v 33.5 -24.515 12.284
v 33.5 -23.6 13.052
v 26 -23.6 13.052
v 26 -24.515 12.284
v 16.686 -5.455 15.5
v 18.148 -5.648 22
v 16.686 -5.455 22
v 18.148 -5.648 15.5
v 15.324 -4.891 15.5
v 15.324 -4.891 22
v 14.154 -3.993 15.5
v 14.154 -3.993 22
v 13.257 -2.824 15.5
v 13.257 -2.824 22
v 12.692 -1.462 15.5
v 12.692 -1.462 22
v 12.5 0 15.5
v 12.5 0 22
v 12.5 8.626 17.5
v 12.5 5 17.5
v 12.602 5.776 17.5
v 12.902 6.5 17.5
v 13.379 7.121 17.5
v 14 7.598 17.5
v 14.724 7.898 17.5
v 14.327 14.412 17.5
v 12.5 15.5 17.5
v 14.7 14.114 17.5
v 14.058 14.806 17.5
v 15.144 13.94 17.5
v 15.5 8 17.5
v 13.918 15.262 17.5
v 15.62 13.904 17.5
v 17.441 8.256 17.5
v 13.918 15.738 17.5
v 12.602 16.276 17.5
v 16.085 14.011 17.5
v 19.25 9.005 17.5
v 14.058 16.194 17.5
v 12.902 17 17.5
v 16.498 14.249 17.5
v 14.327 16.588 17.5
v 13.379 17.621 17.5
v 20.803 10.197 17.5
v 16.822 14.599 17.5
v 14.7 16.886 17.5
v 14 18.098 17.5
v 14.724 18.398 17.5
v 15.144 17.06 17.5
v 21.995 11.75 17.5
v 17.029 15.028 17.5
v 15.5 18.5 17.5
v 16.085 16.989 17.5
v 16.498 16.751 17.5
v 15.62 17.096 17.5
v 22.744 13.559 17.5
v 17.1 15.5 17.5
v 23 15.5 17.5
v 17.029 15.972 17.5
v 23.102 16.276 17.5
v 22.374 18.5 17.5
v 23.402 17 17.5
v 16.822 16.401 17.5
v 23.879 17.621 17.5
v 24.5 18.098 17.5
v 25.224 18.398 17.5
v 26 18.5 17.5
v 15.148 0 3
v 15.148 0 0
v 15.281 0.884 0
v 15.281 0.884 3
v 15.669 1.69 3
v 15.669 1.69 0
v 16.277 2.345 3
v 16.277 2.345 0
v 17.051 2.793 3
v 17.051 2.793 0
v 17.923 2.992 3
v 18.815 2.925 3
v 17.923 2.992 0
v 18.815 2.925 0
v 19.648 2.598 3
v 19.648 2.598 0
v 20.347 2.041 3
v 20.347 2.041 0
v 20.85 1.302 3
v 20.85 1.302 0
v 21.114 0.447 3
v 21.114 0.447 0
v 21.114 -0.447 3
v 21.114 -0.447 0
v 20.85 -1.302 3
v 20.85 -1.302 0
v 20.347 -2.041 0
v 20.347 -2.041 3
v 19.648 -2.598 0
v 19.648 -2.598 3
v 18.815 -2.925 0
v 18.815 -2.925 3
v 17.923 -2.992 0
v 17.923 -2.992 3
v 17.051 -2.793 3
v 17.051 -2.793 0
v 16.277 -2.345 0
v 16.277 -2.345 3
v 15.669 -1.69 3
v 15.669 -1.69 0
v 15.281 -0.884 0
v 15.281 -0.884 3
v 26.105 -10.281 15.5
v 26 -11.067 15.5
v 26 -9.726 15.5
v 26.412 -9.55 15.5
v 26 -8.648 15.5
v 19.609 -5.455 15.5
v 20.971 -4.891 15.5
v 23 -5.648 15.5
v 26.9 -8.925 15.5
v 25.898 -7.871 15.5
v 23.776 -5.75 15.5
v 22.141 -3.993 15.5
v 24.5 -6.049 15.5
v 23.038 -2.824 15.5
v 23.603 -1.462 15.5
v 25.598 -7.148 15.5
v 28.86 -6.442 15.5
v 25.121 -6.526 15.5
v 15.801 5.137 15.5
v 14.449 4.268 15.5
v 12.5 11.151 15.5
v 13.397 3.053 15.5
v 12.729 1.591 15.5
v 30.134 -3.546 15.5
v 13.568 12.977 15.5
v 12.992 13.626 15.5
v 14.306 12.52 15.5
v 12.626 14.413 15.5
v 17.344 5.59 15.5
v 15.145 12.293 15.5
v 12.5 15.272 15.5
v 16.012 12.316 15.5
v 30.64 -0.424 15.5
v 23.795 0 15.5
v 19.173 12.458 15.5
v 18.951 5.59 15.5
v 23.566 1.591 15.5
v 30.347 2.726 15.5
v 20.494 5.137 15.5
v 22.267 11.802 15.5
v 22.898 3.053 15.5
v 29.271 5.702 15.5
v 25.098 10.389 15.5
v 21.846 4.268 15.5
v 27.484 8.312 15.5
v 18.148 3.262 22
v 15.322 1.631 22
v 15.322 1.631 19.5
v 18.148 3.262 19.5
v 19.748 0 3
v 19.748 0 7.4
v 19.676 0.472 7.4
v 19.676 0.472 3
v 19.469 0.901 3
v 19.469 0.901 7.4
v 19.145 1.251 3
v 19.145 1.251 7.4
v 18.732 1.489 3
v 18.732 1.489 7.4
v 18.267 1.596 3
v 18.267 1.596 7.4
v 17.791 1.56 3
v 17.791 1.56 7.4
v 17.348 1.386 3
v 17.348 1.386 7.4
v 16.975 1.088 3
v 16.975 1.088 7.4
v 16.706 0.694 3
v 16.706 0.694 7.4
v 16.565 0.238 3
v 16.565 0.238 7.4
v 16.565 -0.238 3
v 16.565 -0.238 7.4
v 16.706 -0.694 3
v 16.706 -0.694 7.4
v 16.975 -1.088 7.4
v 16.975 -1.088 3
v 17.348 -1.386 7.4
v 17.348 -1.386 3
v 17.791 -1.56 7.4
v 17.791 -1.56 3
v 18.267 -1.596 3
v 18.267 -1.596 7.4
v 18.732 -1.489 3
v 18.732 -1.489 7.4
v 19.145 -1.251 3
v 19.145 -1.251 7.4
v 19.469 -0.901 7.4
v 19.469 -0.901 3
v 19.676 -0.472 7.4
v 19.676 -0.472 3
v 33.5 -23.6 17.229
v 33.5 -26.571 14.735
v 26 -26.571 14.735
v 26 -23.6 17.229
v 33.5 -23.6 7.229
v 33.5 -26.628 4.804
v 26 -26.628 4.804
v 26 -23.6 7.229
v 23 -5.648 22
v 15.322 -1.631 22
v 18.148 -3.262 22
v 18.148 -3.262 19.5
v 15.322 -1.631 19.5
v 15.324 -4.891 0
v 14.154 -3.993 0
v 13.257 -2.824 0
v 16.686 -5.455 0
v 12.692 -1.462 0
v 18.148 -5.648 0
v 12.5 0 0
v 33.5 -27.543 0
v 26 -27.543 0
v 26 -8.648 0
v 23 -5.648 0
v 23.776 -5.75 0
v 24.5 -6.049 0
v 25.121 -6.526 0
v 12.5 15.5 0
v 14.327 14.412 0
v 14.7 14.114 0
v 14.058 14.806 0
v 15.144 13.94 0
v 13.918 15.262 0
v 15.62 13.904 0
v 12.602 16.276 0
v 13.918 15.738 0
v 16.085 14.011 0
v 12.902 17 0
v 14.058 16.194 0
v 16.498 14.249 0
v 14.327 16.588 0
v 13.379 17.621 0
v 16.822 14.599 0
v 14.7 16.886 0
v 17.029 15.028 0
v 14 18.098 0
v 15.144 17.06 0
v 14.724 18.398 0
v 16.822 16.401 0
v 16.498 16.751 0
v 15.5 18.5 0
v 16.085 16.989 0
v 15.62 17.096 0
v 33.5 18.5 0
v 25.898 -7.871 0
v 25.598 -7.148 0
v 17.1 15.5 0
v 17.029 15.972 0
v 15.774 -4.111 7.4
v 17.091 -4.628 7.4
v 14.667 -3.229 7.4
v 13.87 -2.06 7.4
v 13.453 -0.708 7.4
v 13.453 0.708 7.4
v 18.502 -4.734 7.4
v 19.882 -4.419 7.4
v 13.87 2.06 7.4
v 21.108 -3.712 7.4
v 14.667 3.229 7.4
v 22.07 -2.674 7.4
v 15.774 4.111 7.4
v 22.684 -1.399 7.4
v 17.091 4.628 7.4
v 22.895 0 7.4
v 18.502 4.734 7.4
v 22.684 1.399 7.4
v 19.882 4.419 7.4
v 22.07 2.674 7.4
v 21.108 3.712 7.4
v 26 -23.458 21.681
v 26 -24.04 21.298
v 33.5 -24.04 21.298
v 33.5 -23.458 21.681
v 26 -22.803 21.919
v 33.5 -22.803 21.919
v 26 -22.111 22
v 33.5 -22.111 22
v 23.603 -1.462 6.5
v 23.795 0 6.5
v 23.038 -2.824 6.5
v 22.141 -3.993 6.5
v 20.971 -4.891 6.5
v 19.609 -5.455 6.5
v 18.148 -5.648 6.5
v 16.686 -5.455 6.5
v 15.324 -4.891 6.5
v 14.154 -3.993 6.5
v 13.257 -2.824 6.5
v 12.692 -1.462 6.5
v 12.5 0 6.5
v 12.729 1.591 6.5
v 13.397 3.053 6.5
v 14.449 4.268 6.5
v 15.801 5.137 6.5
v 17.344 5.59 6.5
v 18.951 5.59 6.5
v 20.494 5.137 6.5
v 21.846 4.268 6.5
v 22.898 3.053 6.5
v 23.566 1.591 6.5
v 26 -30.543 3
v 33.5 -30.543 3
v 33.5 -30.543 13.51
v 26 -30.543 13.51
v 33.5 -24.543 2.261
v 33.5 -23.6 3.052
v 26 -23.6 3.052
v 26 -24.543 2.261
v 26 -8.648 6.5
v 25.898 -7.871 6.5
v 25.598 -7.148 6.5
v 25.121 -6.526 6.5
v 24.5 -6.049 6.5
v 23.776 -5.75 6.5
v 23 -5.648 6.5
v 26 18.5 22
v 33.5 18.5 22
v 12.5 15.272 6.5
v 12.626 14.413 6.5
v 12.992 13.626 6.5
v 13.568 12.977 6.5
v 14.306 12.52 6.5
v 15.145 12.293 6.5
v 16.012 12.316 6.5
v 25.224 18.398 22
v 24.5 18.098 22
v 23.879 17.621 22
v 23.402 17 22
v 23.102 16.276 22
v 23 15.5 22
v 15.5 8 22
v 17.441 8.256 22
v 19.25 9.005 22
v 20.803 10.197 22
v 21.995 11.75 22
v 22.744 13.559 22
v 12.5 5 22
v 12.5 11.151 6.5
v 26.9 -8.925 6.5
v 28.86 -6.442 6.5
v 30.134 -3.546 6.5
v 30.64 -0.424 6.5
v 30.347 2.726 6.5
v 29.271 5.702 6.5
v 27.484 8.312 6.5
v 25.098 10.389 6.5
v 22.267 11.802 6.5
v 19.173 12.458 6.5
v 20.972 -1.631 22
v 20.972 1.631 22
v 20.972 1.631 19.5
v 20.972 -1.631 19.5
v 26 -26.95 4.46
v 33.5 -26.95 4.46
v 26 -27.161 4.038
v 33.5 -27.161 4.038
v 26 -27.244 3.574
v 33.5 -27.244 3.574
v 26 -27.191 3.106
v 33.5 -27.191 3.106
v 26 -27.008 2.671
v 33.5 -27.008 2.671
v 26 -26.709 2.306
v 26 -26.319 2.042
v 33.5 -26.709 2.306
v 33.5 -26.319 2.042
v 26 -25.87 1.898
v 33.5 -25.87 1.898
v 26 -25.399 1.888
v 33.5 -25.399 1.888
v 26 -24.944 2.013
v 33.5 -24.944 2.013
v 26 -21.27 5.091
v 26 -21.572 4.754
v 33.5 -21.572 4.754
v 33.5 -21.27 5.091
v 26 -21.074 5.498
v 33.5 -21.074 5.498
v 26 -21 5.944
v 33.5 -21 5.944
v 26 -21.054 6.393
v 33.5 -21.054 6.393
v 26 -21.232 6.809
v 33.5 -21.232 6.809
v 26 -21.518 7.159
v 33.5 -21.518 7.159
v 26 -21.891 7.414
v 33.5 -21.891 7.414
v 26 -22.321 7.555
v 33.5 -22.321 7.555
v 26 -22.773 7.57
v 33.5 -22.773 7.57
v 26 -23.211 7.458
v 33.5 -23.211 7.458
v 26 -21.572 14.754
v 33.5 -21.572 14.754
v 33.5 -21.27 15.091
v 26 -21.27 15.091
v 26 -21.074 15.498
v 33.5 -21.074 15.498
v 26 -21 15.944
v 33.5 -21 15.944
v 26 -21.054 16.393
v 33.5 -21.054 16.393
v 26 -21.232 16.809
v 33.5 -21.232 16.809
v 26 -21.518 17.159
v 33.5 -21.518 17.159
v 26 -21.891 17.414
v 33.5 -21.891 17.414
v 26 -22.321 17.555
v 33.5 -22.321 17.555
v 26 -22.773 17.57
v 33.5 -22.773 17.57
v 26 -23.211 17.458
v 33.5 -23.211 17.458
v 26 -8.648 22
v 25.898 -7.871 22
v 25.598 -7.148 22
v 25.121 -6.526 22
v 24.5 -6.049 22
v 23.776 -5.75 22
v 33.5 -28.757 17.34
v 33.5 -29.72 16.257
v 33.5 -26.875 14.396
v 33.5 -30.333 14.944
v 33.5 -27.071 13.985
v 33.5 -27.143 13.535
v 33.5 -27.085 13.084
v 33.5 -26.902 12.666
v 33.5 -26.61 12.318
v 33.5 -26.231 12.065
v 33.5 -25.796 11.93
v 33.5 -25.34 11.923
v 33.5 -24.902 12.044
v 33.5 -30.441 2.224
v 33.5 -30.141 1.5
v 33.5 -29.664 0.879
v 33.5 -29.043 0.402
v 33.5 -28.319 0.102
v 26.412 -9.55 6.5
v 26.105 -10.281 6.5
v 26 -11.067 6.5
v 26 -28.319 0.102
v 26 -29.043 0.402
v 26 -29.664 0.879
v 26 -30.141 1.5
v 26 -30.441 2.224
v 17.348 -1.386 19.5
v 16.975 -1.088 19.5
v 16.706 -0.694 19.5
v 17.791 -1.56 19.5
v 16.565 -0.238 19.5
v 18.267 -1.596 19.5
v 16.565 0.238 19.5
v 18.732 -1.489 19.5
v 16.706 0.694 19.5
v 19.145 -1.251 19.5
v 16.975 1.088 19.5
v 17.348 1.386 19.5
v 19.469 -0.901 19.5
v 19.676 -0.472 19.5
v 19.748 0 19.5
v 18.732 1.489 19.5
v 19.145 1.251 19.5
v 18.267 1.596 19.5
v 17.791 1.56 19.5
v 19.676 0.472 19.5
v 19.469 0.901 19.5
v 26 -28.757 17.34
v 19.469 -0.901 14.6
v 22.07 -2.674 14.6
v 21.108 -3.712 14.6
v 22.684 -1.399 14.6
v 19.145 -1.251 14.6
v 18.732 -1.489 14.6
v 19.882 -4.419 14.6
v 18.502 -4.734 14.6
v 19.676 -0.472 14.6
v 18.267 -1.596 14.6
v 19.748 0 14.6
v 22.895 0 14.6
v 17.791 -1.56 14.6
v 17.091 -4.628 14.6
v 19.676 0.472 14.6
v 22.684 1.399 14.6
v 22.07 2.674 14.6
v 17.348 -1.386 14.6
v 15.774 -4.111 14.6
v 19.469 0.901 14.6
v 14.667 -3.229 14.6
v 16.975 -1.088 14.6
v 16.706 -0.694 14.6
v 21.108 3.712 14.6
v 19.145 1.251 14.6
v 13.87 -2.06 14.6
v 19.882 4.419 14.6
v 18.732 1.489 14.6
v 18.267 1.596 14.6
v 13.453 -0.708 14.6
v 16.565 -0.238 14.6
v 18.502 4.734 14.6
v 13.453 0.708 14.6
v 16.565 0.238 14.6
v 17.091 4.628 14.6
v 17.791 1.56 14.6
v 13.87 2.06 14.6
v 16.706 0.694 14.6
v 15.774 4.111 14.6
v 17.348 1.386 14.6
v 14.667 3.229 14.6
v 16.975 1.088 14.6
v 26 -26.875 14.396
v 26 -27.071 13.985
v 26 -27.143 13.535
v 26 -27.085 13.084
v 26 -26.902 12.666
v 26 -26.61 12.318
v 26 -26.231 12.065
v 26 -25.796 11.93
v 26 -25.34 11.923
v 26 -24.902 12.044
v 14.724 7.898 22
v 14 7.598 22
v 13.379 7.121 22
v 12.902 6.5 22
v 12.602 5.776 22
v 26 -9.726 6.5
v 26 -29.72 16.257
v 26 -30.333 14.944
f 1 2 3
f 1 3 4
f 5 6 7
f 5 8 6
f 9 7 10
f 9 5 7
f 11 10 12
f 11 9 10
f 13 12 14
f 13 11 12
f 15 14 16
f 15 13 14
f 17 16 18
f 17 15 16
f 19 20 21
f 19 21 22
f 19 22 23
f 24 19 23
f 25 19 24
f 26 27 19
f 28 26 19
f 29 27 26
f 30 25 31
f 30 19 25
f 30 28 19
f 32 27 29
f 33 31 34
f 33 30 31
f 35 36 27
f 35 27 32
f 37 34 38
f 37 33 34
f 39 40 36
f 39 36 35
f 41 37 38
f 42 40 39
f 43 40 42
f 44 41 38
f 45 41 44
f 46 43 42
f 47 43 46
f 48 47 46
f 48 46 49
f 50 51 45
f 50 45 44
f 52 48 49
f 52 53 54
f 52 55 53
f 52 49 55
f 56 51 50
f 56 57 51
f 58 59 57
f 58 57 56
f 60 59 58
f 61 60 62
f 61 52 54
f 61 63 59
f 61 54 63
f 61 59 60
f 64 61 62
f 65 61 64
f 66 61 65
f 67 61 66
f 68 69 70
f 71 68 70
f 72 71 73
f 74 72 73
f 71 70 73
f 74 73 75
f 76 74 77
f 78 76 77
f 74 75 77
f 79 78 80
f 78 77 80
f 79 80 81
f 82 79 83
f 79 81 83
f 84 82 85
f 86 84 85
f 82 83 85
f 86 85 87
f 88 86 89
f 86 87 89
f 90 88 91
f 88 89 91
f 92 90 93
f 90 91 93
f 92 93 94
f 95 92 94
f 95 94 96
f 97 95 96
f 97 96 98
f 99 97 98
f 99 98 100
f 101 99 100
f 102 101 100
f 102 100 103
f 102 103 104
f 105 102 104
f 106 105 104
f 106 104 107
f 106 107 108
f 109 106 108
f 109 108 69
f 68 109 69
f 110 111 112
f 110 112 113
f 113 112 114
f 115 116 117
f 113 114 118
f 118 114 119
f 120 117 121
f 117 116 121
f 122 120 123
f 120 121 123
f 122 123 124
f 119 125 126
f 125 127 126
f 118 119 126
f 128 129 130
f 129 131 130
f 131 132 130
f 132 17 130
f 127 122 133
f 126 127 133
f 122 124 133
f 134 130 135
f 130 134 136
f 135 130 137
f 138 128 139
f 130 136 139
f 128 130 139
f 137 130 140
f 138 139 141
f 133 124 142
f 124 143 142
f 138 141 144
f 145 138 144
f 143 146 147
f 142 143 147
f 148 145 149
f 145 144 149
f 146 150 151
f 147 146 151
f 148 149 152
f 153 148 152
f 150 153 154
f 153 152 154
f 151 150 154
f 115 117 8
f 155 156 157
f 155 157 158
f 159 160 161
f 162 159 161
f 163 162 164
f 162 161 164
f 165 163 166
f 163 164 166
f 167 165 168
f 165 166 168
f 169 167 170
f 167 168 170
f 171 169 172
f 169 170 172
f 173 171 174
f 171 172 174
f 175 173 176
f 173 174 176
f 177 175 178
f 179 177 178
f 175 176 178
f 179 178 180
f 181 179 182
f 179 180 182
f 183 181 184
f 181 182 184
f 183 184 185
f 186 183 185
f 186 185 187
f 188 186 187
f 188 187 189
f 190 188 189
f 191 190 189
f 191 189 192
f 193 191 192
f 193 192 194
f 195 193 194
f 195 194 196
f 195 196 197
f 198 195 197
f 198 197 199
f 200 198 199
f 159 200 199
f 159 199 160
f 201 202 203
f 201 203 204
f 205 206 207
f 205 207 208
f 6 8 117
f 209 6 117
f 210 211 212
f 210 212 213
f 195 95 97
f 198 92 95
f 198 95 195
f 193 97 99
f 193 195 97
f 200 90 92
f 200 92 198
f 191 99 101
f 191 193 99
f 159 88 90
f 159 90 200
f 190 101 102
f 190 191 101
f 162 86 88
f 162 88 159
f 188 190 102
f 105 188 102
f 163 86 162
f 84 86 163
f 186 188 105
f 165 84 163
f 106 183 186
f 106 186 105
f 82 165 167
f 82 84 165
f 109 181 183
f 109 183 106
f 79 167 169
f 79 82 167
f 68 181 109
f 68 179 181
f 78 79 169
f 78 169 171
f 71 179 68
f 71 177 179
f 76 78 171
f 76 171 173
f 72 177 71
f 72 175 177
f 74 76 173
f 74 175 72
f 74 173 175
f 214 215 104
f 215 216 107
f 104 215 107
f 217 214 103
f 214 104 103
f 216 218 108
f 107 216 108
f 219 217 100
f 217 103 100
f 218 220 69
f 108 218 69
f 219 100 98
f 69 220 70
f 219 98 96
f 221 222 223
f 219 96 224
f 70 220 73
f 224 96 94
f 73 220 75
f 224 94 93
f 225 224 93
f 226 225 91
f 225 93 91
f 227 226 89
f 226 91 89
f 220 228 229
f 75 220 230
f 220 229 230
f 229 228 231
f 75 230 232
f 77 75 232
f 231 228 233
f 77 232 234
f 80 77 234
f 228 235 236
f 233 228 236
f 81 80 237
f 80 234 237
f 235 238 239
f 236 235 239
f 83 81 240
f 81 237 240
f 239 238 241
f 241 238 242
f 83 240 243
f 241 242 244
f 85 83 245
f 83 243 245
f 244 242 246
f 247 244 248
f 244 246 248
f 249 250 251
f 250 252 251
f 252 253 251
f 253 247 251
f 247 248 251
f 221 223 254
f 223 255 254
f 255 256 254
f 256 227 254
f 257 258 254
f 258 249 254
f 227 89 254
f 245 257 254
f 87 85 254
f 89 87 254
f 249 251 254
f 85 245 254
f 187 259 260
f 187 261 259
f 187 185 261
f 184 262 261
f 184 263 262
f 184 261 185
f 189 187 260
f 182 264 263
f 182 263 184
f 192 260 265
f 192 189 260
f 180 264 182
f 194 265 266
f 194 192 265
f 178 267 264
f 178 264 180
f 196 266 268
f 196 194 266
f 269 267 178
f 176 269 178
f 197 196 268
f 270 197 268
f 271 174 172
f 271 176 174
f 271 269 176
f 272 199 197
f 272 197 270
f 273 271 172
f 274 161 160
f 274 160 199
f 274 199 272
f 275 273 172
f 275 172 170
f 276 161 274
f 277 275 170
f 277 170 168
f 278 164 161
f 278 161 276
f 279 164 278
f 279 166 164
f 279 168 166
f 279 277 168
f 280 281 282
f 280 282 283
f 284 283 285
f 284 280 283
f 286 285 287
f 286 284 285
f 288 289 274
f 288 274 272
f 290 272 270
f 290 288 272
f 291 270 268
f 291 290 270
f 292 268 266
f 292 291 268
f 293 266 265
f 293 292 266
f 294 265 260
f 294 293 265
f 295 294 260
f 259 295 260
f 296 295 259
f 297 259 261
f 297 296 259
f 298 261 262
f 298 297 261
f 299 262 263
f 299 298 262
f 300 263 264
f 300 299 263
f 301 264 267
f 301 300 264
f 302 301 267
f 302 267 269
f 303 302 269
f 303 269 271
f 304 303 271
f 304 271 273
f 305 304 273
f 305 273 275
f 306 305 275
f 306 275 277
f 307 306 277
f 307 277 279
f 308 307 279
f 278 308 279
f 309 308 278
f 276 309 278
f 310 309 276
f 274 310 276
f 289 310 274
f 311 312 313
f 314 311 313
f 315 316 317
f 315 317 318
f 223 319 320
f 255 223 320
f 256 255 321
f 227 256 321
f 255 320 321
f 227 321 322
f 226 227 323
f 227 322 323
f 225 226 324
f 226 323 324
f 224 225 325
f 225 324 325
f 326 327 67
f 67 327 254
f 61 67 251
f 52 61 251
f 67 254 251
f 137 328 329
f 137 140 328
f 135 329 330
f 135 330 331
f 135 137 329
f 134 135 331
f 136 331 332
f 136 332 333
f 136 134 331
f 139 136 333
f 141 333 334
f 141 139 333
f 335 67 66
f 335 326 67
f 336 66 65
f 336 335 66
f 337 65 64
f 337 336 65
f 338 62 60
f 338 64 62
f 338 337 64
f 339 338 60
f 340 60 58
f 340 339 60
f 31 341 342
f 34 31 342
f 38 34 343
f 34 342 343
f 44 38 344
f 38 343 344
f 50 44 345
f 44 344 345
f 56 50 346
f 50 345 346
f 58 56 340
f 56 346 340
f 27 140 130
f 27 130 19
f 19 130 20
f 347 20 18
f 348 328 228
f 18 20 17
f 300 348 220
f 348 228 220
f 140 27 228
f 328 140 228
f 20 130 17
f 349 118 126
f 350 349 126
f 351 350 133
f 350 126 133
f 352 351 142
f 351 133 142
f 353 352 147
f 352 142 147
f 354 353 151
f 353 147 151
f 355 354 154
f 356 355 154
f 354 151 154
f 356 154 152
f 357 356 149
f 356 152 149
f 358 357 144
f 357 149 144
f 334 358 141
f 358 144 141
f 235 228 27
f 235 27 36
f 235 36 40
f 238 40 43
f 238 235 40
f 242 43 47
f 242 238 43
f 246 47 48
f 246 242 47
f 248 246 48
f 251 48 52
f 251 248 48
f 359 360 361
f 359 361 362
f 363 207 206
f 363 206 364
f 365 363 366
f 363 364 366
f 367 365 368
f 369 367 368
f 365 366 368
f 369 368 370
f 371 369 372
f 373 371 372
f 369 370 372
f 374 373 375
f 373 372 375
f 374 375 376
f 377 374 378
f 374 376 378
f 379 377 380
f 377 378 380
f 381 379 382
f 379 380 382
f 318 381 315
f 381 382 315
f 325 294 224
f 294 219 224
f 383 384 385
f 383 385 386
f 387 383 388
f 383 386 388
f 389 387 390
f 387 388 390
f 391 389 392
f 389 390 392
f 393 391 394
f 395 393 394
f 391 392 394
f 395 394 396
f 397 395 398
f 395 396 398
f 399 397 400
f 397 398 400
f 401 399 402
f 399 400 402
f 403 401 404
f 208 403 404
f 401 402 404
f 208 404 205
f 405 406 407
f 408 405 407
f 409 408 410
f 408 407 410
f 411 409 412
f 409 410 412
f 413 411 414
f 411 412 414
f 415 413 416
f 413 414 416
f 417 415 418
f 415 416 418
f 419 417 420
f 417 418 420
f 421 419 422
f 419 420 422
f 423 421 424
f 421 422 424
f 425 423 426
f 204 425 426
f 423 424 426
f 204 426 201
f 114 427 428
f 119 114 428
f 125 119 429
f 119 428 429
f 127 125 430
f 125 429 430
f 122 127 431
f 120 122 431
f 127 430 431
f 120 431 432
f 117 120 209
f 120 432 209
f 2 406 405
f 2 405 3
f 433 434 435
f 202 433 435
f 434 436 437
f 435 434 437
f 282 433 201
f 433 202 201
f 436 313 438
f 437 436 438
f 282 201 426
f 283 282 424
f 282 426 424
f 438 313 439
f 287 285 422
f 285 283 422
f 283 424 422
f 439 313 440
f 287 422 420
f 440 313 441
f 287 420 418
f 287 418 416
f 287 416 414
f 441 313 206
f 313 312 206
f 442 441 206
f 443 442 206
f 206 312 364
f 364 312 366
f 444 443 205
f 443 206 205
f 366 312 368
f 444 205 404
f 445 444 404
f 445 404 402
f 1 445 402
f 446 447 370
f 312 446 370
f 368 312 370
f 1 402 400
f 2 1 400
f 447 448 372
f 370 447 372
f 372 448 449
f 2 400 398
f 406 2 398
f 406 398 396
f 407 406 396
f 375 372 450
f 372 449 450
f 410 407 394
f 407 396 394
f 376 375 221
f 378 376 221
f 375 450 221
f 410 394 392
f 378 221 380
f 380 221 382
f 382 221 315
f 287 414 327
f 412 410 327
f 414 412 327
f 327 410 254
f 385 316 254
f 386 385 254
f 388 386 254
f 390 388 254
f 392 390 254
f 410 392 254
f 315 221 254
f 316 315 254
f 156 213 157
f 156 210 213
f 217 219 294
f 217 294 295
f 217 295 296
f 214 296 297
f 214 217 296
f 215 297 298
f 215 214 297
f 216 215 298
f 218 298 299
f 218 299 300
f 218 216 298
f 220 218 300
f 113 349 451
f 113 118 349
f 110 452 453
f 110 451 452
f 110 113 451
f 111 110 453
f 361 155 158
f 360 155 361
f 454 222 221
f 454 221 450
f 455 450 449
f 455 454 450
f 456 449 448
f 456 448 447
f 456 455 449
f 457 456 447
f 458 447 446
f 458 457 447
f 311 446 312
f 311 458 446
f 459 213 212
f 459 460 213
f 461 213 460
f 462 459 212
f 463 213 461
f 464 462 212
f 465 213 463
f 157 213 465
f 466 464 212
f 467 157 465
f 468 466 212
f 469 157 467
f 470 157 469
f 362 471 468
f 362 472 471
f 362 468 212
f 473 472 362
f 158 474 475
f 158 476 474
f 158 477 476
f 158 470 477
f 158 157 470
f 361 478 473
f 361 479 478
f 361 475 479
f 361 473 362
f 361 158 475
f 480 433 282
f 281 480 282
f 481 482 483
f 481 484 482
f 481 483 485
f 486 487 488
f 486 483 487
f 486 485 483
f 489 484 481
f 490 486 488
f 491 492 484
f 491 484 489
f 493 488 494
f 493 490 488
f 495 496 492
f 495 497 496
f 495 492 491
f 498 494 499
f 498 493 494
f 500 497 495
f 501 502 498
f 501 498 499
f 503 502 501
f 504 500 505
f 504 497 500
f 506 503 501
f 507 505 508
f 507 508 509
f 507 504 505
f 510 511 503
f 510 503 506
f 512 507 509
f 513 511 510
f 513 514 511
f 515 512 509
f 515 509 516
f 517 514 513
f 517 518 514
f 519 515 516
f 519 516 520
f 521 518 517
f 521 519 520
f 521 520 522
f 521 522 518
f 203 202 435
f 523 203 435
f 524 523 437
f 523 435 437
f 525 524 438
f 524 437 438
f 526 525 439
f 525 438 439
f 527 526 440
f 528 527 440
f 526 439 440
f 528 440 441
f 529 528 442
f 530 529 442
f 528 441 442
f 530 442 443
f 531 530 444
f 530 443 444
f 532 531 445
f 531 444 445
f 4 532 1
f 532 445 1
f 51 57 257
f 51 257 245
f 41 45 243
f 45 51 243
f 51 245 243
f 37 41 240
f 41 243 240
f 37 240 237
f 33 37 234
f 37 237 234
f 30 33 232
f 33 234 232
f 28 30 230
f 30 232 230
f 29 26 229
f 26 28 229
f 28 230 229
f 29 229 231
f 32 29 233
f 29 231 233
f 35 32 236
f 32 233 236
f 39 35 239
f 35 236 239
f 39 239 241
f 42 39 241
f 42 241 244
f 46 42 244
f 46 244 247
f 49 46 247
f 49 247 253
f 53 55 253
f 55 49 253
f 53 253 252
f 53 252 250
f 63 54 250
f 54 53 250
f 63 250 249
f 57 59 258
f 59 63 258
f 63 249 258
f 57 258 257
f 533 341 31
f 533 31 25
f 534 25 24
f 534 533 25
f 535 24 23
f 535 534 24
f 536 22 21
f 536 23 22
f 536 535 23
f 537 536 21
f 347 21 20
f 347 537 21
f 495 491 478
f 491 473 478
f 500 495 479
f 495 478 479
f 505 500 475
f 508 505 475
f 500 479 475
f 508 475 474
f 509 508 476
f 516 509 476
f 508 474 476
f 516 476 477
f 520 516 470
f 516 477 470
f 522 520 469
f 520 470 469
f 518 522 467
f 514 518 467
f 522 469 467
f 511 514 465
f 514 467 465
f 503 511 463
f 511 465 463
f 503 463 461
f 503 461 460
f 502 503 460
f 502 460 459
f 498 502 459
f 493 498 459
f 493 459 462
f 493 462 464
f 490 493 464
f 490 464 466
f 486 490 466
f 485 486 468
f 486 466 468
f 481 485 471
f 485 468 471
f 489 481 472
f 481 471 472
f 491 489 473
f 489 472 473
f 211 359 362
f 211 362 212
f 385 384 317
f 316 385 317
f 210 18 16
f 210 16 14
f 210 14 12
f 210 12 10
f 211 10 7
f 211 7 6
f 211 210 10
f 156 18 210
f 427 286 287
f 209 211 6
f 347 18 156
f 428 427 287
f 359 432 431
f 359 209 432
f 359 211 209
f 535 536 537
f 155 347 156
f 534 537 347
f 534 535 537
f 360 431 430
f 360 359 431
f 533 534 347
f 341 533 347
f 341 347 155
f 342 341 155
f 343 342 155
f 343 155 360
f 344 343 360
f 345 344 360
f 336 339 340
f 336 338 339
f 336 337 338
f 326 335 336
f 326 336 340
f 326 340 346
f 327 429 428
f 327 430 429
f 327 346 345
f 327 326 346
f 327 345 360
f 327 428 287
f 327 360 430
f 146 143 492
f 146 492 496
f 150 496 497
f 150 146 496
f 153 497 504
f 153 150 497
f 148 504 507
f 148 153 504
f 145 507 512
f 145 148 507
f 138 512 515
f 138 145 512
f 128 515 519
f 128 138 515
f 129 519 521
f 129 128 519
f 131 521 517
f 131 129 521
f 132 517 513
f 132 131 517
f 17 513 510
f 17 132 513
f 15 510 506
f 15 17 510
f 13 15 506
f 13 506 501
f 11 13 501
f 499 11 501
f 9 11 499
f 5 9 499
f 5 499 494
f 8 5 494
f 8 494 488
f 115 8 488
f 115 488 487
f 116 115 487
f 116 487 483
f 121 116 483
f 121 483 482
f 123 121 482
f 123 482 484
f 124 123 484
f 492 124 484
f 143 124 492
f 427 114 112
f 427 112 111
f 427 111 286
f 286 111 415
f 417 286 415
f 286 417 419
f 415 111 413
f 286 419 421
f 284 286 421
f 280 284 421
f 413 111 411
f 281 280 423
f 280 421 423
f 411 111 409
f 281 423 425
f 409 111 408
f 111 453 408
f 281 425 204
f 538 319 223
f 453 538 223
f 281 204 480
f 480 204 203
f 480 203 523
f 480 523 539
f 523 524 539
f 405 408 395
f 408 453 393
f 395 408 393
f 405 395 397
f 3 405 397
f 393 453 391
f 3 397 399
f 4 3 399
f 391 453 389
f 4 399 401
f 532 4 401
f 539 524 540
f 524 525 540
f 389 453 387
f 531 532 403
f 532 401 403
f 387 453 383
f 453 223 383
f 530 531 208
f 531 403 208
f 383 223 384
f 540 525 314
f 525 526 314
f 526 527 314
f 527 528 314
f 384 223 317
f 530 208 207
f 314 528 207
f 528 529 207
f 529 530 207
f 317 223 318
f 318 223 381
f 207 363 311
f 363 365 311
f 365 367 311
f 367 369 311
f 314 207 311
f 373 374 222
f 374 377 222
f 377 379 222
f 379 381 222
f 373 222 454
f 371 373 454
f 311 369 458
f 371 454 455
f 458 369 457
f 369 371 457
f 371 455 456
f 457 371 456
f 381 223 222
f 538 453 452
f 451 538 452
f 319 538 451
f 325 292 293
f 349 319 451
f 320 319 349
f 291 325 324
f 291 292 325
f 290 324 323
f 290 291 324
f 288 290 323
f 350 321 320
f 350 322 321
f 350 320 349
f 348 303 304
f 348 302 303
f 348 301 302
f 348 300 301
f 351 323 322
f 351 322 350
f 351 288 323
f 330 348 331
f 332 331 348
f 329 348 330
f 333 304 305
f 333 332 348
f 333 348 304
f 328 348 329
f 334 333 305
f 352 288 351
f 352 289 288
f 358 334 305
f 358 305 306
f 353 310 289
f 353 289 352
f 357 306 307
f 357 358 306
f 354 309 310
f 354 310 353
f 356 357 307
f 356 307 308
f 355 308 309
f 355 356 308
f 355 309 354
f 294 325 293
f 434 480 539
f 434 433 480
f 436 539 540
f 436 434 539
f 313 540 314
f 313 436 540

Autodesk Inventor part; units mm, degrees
ref_plane "YZ Plane" through (0, 0, 0) normal (1, 0, 0) x (0, 1, 0)
ref_plane "XZ Plane" through (0, 0, 0) normal (0, 1, 0) x (-1, 0, 0)
ref_plane "XY Plane" through (0, 0, 0) normal (0, 0, 1) x (1, 0, 0)
sketch "Sketch1" plane through (0, 0, 0) normal (0, 0, 1) x (1, 0, 0)
  arc A0 (18.8782, 11.9777) -> (7.1013, 4.6885) centre (18.1475, 0) ccw projected
  arc A1 (18.8782, 11.9777) -> (21, 13.974) centre (19, 13.974) ccw projected
  line L0 (21, 13.974) -> (21, 19) projected
  arc A2 (21, 19) -> (19, 21) centre (19, 19) ccw projected
  line L1 (19, 21) -> (-19, 21) projected
  arc A3 (-19, 21) -> (-21, 19) centre (-19, 19) ccw projected
  line L2 (-21, 19) -> (-21, -19) projected
  arc A4 (-21, -19) -> (-19, -21) centre (-19, -19) ccw projected
  line L3 (-19, -21) -> (7.9725, -21) projected
  arc A5 (9.9725, -23) -> (7.9725, -21) centre (7.9725, -23) ccw projected
  line L4 (9.9725, -23.6) -> (9.9725, -23) projected
  arc A6 (9.9725, -23.6) -> (11.9725, -25.6) centre (11.9725, -23.6) ccw projected
  line L5 (19, -25.6) -> (11.9725, -25.6) projected
  arc A7 (19, -25.6) -> (21, -23.6) centre (19, -23.6) ccw projected
  line L6 (21, -13.974) -> (21, -23.6) projected
  arc A8 (21, -13.974) -> (18.8782, -11.9777) centre (19, -13.974) ccw projected
  circle A9 centre (-15.5, 15.5) radius 1.6 projected
  circle A10 centre (15.5, -15.5) radius 1.6 projected
  circle A11 centre (-15.5, -15.5) radius 1.6 projected
  circle A12 centre (15.5, 15.5) radius 1.6 projected
  arc A13 (21, 19) -> (19, 21) centre (19, 19) ccw projected
  line L7 (21, 13.974) -> (21, 19) projected
  arc A14 (18.8782, 11.9777) -> (21, 13.974) centre (19, 13.974) ccw projected
  arc A15 (18.8782, 11.9777) -> (9, 7.7668) centre (18.1475, 0) ccw projected
  line L8 (9, 7.7668) -> (9, 19) projected
  arc A16 (9, 19) -> (7, 21) centre (7, 19) ccw projected
  line L9 (19, 21) -> (7, 21) projected
  circle A17 centre (15.5, 15.5) radius 1.6 projected
  arc A18 (15.5, 18.5) -> (12.5, 15.5) centre (15.5, 15.5) ccw
  arc A19 (12.5, 0) -> (18.1475, -5.6475) centre (18.1475, 0) ccw
  line L10 (12.5, 15.5) -> (12.5, 0)
  line L11 (18.1475, -5.6475) -> (26, -5.6475)
  line L12 (26, -5.6475) -> (26, -31.6)
  line L13 (26, -31.6) -> (33.5, -31.6)
  line L14 (33.5, -31.6) -> (33.5, 18.5)
  line L15 (33.5, 18.5) -> (15.5, 18.5)
  arc A20 (5.4082, 4.4443) -> (7.1013, 4.6885) centre (6.1808, 5.0792) ccw projected
  arc A21 (7.1013, -4.6885) -> (18.8782, -11.9777) centre (18.1475, 0) ccw projected
  arc A22 (7.1013, -4.6885) -> (5.4082, -4.4443) centre (6.1808, -5.0792) ccw projected
  arc A23 (5.4082, 4.4443) -> (5.4082, -4.4443) centre (0, 0) ccw projected
  point P0 (0, 0)
  point P1 (29.75, -31.6)
  dimension "d1" = 7.5
  dimension "d2" = 5
  dimension "d3" = 6
  dimension "d39" = 3
extrude "Extrusion1" add sketch "Sketch1" along normal blind 22 contours L10 A18 L15 L0 A1 A0 | A0 A1 L0 L15 L14 L13 L12 L11 A19 L10
sketch "Sketch2" plane through (0, 0, 22) normal (0, 0, 1) x (1, 0, 0)
  circle A0 centre (15.5, 15.5) radius 1.6 projected
  arc A1 (15.5, 18.5) -> (12.5, 15.5) centre (15.5, 15.5) ccw projected
  circle A2 centre (15.5, 15.5) radius 7.5
  point P0 (0, 0)
  dimension "d6" = 15
extrude "Extrusion2" cut sketch "Sketch2" against normal blind 4.5
ref_plane "Work Plane1" through (0, 0, 11) normal (0, 0, 1) x (1, 0, 0)
sketch "Sketch3" plane through (0, 0, 11) normal (0, 0, 1) x (1, 0, 0)
  line L0 (15.5, 18.5) -> (33.5, 18.5) projected
  line L1 (33.5, 18.5) -> (33.5, -31.6) projected
  line L2 (33.5, -31.6) -> (26, -31.6) projected
  line L3 (26, -31.6) -> (26, -5.6475) projected
  line L4 (26, -5.6475) -> (18.1475, -5.6475) projected
  arc A0 (12.5, 0) -> (18.1475, -5.6475) centre (18.1475, 0) ccw projected
  line L5 (12.5, 0) -> (12.5, 15.5) projected
  arc A1 (15.5, 18.5) -> (12.5, 15.5) centre (15.5, 15.5) ccw projected
  circle A2 centre (15.5, 15.5) radius 1.6 projected
  circle A3 centre (18.1475, 0) radius 12.5
  point P0 (0, 0)
  dimension "d11" = 25
extrude "Extrusion3" cut sketch "Sketch3" along normal mid plane 9 contours A3 L3 L4 A0 L5 | L5 A0 L4 L3 A3
sketch "Sketch4" plane through (0, 0, 6.5) normal (0, 0, 1) x (1, 0, 0)
  arc A0 (12.5, 0) -> (18.1475, -5.6475) centre (18.1475, 0) ccw projected
  arc A1 (26, -9.7256) -> (12.5, 11.1515) centre (18.1475, 0) ccw projected
  circle A2 centre (18.1475, 0) radius 5.6475
  point P0 (0, 0)
extrude "Extrusion4" add sketch "Sketch4" along normal blind 0.9 draft -45
mirror "Mirror1" about plane through (0, 0, 11) normal (0, 0, 1) of "Extrusion4"
sketch "Sketch5" plane through (0, 0, 22) normal (0, 0, 1) x (1, 0, 0)
  arc A0 (12.5, 0) -> (18.1475, -5.6475) centre (18.1475, 0) ccw projected
  circle A1 centre (18.1475, 0) radius 1.6
  point P0 (0, 0)
  dimension "d18" = 3.2
extrude "Extrusion5" cut sketch "Sketch5" against normal through all
sketch "Sketch6" plane through (0, 0, 0) normal (0, 0, -1) x (-1, 0, 0)
  circle A0 centre (-18.1475, 0) radius 1.6 projected
  arc A1 (-18.1475, -5.6475) -> (-12.5, 0) centre (-18.1475, 0) ccw projected
  circle A2 centre (-18.1475, 0) radius 3
  point P0 (0, 0)
  dimension "d23" = 6
extrude "Extrusion6" cut sketch "Sketch6" against normal blind 3
sketch "Sketch7" plane through (0, 0, 22) normal (0, 0, 1) x (1, 0, 0)
  circle A0 centre (18.1475, 0) radius 1.6 projected
  arc A1 (12.5, 0) -> (18.1475, -5.6475) centre (18.1475, 0) ccw projected
  line L0 (18.1475, 3.262) -> (20.9725, 1.631)
  line L1 (20.9725, 1.631) -> (20.9725, -1.631)
  line L2 (20.9725, -1.631) -> (18.1475, -3.262)
  line L3 (18.1475, -3.262) -> (15.3225, -1.631)
  line L4 (15.3225, -1.631) -> (15.3225, 1.631)
  line L5 (15.3225, 1.631) -> (18.1475, 3.262)
  point P0 (0, 0)
  dimension "d27" = 5.65
extrude "Extrusion7" cut sketch "Sketch7" against normal blind 2.5
sketch "Sketch8" plane through (33.5, -31.6, 0) normal (1, 0, 0) x (0, 0, -1)
  line L0 (-22, 17.626) -> (0, 17.626) projected
  line L1 (-17.2286, 8) -> (-22, 8) projected
  arc A0 (-14.7539, 10.0285) -> (-17.2286, 8) centre (-15.9796, 9) ccw projected
  line L2 (-14.7539, 10.0285) -> (-13.0518, 8) projected
  line L3 (-7.2286, 8) -> (-13.0518, 8) projected
  arc A1 (-4.7539, 10.0285) -> (-7.2286, 8) centre (-5.9796, 9) ccw projected
  line L4 (-4.7539, 10.0285) -> (-3.0518, 8) projected
  line L5 (0, 8) -> (-3.0518, 8) projected
  line L6 (0, 17.626) -> (0, 8) projected
  line L7 (-13.0518, 8) -> (-12.2843, 7.0853)
  arc A2 (-14.7353, 5.0287) -> (-12.2843, 7.0853) centre (-13.5098, 6.057) ccw
  line L8 (-14.7353, 5.0287) -> (-17.2286, 8)
  line L9 (-3.0518, 8) -> (-2.2607, 7.0571)
  arc A3 (-4.8043, 4.9721) -> (-2.2607, 7.0571) centre (-3.5205, 6) ccw
  line L10 (-4.8043, 4.9721) -> (-7.2286, 8)
  line L11 (-22, 17.626) -> (-22, 8) projected
  point P0 (0, 31.6)
  dimension "d30" = 3
extrude "Extrusion8" cut sketch "Sketch8" against normal through all contours A0 L2 L7 A2 L8 | L9 A3 L10 A1 L4
sketch "Sketch9" plane through (33.5, -31.6, 0) normal (1, 0, 0) x (0, 0, -1)
  line L0 (-4.7539, 10.0285) -> (-2.2607, 7.0571) projected
  line L1 (0, 50.1) -> (0, 0) projected
  line L2 (-22, 0) -> (-22, 50.1) projected
  line L3 (0, 0) -> (-22, 0) projected
  line L4 (0, 1.057) -> (-13.5098, 1.057)
  arc A0 (-17.3401, 2.8431) -> (-13.5098, 1.057) centre (-13.5098, 6.057) ccw
  line L5 (-17.3401, 2.8431) -> (-22, 8.3966)
  arc A1 (-14.7353, 5.0287) -> (-12.2843, 7.0853) centre (-13.5098, 6.057) ccw projected
  point P0 (0, 31.6)
  dimension "d33" = 5
extrude "Extrusion9" cut sketch "Sketch9" against normal through all
fillet "Fillet1" radius 3 8 edges at (26, -5.6475, 18.75) (26, -5.6475, 3.25) (12.5, 11.1515, 11) (26, -9.7256, 11) (29.75, -23.2034, 22) (29.75, -30.543, 0) (12.5, 8.6261, 19.75) (22.3739, 18.5, 19.75)
properties part number "ARM"
